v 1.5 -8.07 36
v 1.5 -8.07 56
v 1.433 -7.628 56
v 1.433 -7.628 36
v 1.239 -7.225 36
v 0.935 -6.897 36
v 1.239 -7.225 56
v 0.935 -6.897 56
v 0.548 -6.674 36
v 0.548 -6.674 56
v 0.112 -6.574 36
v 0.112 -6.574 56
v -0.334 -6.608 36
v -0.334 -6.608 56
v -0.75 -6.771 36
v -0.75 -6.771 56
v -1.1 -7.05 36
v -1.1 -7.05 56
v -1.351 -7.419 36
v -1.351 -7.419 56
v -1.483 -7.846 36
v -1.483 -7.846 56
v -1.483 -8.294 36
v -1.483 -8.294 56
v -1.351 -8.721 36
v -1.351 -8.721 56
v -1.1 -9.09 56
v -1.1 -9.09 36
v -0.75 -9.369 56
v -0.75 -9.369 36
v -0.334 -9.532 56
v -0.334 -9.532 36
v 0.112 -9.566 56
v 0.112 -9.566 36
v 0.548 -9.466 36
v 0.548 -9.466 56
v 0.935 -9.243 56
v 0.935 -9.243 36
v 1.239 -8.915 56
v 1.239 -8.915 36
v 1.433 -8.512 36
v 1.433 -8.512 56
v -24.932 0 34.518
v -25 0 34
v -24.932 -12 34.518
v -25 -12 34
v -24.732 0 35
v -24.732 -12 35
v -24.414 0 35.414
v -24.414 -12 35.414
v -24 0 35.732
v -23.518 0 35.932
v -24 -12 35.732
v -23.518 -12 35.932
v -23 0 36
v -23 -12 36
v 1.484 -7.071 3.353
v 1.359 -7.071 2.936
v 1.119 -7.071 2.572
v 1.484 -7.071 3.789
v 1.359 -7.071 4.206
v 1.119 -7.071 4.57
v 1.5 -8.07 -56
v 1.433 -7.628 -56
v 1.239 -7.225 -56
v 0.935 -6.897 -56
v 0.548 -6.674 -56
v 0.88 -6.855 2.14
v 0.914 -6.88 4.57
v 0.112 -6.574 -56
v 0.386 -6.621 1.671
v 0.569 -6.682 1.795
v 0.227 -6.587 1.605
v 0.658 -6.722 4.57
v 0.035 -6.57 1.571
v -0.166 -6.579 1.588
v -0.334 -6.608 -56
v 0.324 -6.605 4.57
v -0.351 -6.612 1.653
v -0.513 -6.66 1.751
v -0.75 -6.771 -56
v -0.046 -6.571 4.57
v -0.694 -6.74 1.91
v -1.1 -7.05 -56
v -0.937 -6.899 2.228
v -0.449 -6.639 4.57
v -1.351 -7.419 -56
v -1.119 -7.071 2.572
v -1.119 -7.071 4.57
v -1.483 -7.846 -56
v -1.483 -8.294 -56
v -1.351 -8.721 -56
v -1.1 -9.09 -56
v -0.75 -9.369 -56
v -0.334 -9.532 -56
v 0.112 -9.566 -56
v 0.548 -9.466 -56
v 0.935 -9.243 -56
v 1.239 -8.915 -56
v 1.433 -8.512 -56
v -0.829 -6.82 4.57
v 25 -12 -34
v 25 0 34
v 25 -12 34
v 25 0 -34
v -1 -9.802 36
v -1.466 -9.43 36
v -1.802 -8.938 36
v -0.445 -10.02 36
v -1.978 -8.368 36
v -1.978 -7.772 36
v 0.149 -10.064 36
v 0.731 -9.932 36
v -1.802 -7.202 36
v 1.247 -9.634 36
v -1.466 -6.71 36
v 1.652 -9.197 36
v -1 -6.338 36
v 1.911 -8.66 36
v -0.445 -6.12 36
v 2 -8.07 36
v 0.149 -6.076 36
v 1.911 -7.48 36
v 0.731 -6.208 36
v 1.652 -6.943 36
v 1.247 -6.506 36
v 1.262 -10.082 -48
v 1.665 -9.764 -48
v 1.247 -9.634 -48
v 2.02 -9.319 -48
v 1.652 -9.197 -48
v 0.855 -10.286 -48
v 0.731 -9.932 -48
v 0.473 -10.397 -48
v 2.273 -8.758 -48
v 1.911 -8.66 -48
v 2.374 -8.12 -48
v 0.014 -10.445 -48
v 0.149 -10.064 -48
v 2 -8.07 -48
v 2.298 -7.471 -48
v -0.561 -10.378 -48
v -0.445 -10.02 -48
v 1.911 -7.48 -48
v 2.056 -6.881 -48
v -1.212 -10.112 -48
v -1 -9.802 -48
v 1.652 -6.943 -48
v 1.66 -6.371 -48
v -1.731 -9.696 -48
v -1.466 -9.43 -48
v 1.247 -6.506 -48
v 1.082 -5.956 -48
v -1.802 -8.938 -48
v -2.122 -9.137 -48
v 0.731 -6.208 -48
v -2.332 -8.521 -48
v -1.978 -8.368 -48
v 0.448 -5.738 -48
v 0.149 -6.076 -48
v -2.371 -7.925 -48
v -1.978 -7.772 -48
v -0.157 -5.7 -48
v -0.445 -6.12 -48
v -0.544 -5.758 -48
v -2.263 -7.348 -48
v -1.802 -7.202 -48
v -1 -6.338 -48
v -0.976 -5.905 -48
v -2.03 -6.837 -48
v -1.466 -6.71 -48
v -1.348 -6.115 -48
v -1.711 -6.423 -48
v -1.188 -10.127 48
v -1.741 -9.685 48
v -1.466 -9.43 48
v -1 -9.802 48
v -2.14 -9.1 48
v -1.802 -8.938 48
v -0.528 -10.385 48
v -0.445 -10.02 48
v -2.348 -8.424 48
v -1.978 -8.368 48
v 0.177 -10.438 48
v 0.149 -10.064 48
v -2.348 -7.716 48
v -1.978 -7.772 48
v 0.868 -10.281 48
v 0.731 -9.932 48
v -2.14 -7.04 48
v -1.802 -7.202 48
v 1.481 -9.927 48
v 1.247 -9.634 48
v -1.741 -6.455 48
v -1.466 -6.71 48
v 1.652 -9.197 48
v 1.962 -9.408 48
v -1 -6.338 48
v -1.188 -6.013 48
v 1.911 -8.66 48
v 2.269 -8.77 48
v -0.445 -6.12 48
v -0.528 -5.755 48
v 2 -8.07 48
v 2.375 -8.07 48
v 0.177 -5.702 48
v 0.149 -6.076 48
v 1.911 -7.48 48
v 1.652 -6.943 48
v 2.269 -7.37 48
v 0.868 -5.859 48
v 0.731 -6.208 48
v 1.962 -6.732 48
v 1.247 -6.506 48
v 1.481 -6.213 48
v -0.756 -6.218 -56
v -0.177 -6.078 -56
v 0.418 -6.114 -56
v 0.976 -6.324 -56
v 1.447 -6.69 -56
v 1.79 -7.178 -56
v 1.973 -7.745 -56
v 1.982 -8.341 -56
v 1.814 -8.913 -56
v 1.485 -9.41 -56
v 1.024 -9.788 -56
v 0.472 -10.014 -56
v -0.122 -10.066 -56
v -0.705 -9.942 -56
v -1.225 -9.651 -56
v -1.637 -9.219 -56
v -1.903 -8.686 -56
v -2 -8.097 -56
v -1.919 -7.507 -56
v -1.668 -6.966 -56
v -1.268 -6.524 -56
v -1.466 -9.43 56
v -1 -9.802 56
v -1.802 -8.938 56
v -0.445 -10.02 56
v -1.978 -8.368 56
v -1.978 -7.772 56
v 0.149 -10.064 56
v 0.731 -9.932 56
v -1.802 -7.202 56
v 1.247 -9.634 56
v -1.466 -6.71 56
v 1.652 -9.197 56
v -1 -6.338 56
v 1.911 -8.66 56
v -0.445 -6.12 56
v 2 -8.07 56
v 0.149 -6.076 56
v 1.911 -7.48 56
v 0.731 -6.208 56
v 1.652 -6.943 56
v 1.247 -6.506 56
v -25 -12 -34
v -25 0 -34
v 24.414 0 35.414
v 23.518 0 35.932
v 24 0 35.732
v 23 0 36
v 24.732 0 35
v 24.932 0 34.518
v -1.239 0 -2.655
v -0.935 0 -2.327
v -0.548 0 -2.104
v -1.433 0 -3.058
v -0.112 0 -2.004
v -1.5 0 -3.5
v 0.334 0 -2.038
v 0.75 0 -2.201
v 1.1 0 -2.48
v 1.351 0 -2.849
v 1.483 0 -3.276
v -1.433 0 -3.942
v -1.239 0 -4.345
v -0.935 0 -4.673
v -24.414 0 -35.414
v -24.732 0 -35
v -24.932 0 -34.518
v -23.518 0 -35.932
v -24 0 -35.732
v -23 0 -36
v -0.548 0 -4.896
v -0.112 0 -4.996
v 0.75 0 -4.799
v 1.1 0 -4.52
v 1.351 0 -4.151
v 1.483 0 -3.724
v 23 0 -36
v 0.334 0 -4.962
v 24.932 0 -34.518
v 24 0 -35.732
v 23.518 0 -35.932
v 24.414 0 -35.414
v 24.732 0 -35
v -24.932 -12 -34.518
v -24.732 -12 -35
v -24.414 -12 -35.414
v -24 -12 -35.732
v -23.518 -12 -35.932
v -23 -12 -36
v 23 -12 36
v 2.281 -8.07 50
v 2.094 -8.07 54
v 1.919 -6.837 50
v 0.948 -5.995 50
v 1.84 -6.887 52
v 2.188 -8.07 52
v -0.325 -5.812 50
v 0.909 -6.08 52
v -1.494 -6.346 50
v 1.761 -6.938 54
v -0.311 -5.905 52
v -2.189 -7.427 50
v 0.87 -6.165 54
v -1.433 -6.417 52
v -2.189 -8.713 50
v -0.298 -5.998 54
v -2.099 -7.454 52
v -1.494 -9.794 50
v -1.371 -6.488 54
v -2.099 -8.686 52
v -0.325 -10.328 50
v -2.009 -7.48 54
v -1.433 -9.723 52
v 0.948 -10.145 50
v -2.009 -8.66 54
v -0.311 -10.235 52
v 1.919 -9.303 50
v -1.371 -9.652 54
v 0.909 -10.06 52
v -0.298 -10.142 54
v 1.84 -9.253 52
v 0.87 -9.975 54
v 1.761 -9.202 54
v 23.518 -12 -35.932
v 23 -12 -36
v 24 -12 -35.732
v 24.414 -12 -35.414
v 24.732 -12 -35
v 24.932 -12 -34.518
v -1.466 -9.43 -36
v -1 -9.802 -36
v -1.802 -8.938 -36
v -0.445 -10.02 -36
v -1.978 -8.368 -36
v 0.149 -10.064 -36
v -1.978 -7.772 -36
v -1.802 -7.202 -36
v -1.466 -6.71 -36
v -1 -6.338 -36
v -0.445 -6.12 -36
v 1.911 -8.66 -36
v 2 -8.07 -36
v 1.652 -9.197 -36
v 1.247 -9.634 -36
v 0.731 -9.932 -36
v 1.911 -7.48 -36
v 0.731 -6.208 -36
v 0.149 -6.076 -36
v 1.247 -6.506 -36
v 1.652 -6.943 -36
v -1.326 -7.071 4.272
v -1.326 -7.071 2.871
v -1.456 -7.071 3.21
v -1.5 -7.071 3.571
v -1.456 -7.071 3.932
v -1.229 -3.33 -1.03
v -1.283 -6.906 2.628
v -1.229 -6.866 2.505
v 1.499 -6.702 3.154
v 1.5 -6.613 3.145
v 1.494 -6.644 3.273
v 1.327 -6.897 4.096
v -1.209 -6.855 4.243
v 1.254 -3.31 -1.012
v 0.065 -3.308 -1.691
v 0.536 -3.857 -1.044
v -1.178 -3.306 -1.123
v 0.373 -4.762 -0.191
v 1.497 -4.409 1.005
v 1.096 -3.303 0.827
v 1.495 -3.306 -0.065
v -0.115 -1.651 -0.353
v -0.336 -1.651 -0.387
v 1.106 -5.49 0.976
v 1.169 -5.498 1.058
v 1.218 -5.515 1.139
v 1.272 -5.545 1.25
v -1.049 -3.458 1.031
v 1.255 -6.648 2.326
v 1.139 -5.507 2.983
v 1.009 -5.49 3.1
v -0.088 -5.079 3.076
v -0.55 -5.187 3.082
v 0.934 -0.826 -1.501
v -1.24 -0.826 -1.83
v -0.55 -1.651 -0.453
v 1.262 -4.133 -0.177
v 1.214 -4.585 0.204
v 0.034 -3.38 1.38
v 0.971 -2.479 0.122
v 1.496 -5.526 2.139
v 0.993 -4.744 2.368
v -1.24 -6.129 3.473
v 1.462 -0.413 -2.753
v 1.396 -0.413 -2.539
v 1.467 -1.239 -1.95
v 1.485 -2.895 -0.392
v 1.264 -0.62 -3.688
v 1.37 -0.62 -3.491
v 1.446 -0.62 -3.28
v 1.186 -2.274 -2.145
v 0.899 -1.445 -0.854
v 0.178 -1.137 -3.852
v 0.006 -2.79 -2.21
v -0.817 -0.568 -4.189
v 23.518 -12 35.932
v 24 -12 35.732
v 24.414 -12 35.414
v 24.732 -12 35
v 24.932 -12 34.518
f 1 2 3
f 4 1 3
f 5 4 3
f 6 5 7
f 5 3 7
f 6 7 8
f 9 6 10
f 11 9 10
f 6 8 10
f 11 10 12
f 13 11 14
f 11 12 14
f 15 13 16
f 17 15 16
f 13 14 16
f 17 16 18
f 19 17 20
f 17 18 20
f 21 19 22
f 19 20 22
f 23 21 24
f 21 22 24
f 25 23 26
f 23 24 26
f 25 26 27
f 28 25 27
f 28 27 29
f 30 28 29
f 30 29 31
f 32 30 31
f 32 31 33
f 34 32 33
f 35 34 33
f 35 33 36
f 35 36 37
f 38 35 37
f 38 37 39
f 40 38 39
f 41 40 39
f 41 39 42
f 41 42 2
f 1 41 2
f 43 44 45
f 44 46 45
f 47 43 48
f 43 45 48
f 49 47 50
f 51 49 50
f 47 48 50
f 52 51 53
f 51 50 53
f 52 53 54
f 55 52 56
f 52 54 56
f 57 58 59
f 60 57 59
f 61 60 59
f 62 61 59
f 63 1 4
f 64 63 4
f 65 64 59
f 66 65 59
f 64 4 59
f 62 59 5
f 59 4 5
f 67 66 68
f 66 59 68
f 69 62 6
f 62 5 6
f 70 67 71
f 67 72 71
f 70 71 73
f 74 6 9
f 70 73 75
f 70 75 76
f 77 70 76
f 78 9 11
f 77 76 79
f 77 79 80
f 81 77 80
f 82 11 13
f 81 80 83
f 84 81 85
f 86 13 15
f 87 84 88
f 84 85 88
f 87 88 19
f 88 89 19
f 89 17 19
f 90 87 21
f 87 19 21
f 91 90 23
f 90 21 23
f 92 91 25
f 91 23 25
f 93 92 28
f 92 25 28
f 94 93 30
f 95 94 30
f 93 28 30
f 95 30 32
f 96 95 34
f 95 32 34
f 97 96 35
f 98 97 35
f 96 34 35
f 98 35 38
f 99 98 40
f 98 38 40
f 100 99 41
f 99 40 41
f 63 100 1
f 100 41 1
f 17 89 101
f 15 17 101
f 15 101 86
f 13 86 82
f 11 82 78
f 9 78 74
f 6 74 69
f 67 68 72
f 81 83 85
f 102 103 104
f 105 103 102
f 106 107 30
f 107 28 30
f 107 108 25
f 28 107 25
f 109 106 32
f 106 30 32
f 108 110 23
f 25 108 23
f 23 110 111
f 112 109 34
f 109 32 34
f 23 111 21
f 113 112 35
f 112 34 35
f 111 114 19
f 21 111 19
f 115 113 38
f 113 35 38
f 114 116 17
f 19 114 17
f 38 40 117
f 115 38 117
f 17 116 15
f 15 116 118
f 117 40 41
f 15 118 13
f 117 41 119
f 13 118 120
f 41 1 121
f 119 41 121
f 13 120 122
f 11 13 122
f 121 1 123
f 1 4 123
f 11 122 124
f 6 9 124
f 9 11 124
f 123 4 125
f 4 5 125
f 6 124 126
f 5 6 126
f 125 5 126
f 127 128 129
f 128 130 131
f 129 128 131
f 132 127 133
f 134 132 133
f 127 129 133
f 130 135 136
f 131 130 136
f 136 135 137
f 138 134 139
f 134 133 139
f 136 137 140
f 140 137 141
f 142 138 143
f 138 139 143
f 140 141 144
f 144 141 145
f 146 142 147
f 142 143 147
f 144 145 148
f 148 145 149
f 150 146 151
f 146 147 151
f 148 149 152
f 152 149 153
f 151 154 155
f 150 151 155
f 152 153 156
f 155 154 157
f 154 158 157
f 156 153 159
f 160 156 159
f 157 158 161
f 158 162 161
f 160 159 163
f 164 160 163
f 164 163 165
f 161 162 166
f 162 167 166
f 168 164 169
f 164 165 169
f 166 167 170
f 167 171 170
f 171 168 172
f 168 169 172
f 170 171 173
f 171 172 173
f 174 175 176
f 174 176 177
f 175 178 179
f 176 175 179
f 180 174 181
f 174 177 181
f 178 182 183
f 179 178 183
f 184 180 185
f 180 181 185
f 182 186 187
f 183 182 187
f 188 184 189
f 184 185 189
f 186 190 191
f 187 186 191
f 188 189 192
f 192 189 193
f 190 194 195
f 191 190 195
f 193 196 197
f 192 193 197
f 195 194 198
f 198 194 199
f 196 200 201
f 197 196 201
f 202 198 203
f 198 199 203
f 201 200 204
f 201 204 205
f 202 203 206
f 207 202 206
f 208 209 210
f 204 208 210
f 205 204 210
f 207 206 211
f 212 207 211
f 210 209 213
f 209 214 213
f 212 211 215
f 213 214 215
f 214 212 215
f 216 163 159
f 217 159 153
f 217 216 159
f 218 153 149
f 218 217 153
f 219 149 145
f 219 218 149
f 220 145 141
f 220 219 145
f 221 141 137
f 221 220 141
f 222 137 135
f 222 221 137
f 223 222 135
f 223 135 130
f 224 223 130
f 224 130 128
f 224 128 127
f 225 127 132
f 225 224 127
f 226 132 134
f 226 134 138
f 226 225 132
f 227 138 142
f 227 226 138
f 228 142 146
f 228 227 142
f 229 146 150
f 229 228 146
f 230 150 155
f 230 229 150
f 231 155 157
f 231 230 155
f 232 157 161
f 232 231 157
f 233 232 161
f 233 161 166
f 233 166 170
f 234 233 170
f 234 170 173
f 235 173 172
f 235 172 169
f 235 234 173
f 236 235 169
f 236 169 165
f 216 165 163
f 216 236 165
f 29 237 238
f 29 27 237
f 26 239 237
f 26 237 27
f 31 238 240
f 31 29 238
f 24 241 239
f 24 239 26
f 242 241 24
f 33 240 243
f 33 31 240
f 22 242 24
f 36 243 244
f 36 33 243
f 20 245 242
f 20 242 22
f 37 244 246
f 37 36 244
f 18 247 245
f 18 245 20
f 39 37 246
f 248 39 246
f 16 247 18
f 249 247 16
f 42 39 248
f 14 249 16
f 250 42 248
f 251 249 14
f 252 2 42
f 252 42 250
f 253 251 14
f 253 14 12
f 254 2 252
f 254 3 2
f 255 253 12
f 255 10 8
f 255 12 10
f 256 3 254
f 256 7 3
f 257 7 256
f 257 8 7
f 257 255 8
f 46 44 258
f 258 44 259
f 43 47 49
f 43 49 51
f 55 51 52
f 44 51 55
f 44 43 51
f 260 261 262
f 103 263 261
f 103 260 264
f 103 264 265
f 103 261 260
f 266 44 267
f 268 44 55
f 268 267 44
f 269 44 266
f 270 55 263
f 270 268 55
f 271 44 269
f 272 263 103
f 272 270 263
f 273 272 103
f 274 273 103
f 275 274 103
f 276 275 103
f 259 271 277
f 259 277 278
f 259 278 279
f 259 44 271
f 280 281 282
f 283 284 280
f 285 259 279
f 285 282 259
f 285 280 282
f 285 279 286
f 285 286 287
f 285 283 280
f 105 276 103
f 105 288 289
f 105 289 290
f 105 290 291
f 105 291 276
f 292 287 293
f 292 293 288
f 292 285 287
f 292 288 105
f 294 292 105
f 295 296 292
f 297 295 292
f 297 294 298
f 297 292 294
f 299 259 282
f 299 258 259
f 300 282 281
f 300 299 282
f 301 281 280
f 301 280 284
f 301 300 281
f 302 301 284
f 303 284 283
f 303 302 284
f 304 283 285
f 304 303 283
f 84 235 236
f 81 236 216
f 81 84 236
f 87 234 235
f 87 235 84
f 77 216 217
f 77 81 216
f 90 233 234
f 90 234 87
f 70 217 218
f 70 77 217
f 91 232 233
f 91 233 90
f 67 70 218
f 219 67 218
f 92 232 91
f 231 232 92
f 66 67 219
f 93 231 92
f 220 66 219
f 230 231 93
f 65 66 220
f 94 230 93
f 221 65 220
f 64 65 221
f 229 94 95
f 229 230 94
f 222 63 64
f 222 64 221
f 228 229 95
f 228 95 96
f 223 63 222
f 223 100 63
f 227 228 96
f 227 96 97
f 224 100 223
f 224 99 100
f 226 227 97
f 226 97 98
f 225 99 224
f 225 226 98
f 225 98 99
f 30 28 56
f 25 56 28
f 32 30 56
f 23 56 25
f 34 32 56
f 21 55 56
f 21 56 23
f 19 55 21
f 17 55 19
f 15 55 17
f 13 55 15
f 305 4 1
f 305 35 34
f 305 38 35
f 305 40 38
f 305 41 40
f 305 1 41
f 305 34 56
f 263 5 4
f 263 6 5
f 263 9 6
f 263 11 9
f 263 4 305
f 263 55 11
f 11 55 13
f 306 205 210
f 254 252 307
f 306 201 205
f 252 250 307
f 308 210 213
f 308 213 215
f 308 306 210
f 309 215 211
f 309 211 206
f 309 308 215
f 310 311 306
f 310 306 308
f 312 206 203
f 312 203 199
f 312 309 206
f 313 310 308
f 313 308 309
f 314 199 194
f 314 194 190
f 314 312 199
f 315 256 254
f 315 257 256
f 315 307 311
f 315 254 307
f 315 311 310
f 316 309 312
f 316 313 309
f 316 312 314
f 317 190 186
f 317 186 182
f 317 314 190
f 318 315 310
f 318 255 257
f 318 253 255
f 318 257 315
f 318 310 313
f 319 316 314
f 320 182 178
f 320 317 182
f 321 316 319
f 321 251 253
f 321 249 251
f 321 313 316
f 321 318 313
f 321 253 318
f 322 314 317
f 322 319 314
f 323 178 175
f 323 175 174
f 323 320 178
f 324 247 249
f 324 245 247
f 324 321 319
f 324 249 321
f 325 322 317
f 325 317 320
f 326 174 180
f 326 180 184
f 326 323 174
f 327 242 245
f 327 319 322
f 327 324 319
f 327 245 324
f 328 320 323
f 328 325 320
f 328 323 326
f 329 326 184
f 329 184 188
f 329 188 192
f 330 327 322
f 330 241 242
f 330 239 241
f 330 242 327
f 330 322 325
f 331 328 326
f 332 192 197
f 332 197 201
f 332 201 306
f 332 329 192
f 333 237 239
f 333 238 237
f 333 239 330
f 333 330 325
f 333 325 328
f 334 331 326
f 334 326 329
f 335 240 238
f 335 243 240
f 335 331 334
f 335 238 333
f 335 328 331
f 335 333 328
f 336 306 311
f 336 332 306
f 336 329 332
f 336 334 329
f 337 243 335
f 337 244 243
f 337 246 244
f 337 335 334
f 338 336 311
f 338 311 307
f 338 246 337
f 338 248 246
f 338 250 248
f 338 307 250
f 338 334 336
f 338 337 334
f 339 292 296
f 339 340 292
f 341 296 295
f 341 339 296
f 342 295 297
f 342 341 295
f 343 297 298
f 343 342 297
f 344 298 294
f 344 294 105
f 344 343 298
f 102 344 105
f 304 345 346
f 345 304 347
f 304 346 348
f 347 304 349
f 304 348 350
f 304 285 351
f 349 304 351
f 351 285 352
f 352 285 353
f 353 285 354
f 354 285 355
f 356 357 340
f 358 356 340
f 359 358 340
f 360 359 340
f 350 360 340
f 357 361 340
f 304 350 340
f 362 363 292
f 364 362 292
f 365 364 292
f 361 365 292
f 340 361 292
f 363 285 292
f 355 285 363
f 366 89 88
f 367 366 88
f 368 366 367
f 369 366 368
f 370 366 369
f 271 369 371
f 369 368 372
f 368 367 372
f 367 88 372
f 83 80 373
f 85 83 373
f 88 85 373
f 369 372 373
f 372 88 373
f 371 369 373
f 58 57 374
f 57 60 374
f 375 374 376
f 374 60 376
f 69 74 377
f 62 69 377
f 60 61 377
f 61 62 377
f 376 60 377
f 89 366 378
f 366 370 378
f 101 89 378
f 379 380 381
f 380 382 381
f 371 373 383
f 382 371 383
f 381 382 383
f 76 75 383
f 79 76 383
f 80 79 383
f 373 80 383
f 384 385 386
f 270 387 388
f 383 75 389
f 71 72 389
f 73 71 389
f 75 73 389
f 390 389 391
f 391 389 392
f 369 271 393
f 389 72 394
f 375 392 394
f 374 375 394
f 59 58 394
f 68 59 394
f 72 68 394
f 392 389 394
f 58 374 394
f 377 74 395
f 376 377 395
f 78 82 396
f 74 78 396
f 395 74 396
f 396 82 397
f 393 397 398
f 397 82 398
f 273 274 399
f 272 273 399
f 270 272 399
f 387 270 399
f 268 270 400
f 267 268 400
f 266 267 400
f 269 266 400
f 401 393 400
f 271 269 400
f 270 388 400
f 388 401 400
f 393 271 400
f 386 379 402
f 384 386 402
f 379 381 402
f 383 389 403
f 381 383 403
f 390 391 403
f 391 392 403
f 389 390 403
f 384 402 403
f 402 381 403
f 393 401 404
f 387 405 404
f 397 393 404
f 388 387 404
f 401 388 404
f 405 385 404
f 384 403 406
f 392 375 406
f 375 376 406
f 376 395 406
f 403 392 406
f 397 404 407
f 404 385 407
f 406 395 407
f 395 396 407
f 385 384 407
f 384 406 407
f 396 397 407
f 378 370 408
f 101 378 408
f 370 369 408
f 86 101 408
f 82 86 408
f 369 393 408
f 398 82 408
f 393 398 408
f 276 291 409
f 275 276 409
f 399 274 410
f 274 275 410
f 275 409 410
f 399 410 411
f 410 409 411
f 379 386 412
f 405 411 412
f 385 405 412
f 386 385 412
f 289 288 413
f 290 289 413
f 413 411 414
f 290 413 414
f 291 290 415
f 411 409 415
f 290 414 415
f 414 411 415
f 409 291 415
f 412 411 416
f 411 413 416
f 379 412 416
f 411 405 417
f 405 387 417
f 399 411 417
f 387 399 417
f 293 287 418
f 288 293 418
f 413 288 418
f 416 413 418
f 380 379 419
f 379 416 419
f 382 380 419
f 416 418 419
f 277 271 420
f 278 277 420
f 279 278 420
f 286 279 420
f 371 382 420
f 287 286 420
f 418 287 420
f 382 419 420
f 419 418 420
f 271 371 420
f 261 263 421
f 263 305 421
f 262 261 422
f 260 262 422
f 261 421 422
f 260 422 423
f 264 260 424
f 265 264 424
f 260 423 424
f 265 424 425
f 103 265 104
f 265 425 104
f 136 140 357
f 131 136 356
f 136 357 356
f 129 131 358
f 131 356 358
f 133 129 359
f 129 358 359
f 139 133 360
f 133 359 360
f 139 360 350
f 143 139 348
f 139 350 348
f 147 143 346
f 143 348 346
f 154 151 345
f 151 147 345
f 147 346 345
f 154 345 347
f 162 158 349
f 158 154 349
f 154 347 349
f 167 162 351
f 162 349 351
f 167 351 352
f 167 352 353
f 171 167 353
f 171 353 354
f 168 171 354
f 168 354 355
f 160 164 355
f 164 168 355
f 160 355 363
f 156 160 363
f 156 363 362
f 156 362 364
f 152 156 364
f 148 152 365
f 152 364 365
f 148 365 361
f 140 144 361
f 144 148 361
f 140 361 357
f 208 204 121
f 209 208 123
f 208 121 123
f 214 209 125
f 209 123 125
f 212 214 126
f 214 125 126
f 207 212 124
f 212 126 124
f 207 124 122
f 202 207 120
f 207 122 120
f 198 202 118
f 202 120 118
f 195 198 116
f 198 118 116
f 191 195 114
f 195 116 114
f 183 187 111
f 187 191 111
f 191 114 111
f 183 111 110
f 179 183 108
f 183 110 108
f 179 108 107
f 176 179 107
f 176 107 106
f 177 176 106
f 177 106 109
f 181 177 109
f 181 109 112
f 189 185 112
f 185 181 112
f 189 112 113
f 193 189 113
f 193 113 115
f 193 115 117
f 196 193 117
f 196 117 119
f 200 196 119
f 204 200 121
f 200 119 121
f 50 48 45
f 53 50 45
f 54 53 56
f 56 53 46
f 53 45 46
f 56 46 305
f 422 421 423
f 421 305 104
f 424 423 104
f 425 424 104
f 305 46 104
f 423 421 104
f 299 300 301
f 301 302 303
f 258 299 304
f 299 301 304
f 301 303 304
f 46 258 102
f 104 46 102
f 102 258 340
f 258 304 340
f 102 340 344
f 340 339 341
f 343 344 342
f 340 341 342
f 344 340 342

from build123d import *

# Parameters (mm, degrees)
PLATFORM_W                   = 50
PLATFORM_H                   = 72
PLATFORM_W_2                 = 22.5
PLATFORM_H_2                 = 43
PLATFORM_HEIGHT_DEPTH        = 12
TUBE_INNER_DIAMETER_SKETCH_R = 1.5
FILLET1_R                    = 2
OUTER_DIAMETER_OF_LUMEN_1_R  = 2
TUBING_SIDE_1_DEPTH          = 20
OUTER_DIAMETER_OF_LUMEN_2_R  = 2
TUBING_SIDE_2_DEPTH          = 20
ADAPTER_1_SKETCH_R           = 2.375
LUMEN_INNER_DIAMETER_R       = 1.5
HOLLOWING_OUT_LUMEN_DEPTH    = 116.381974426


with BuildPart() as part:
    # Platform → Platform Height (new body)
    # profile 1 of 2: a face of its own
    with BuildSketch(Plane(origin=(0, 0, 0), x_dir=(1, 0, 0), z_dir=(0, 1, 0))):
        Rectangle(PLATFORM_W, PLATFORM_H)
        Rectangle(PLATFORM_W_2, PLATFORM_H_2, mode=Mode.SUBTRACT)
    # profile 2 of 2: a face of its own
    with BuildSketch(Plane(origin=(0, 0, 0), x_dir=(1, 0, 0), z_dir=(0, 1, 0))):
        Rectangle(PLATFORM_W_2, PLATFORM_H_2)
    extrude(amount=-PLATFORM_HEIGHT_DEPTH)

    # Tube Inner Diameter: sweep along a curve in space
    with BuildLine() as tube_inner_diameter_path:
        Line((0, 0, -3.5), (0, -7.071067812, 3.571067812))
    # Tube Inner Diameter Sketch → Tube Inner Diameter (sweep, cut)
    with BuildSketch(Plane(origin=(0, 0, 0), x_dir=(-1, 0, 0), z_dir=(0, -1, 0))):
        with Locations((0, 3.5)):
            Circle(TUBE_INNER_DIAMETER_SKETCH_R)
    sweep(path=tube_inner_diameter_path.line, mode=Mode.SUBTRACT)

    # Fillet1
    fillet1_edges = [part.edges().sort_by_distance(p)[0] for p in [
        (25, -6, 36),
        (-25, -6, 36),
        (-25, -6, -36),
        (25, -6, -36),
    ]]
    fillet(fillet1_edges, radius=FILLET1_R)

    # Outer Diameter of Lumen 2 → Tubing Side 2 (add)
    with BuildSketch(Plane(origin=(0, 0, -36), x_dir=(-1, 0, 0), z_dir=(0, 0, -1))):
        with Locations(Location((0, -8.07, 0), (0, 0, 180))):
            Circle(OUTER_DIAMETER_OF_LUMEN_2_R)
    extrude(amount=TUBING_SIDE_2_DEPTH)

    # Adapter #2: read off the stored shape, not the designer's step
    # Adapter #2: loft between two sections, ruled curve by curve
    adapter_2_from = [
        Edge.make_bspline([(-0.156573295, -5.700166714, -48), (4.583093277, -5.387020124, -48), (4.896239867, -10.126686696, -48), (0.156573295, -10.439833286, -48), (-4.583093277, -10.752979876, -48), (-4.896239867, -6.013313304, -48), (-0.156573295, -5.700166714, -48)], [0, 0, 0, 0, 0.5, 0.5, 0.5, 1, 1, 1, 1], 3, [1, 0.333333333, 0.333333333, 1, 0.333333333, 0.333333333, 1]),
    ]
    adapter_2_to = [
        Edge.make_bspline([(-0.756069385, -6.218417141, -56), (2.947096334, -4.706278371, -56), (4.459235104, -8.40944409, -56), (0.756069385, -9.921582859, -56), (-2.947096334, -11.433721629, -56), (-4.459235104, -7.73055591, -56), (-0.756069385, -6.218417141, -56)], [0, 0, 0, 0, 0.5, 0.5, 0.5, 1, 1, 1, 1], 3, [1, 0.333333333, 0.333333333, 1, 0.333333333, 0.333333333, 1]),
    ]
    adapter_2 = Solid(Shell([*[Face.make_surface_from_curves(adapter_2_from[k], adapter_2_to[k]) for k in range(1)], Face(Wire(adapter_2_from)), Face(Wire(adapter_2_to))]))
    add(adapter_2)


with BuildPart() as body_2:
    # Outer Diameter of Lumen 1 → Tubing Side 1 (new body)
    with BuildSketch(Plane.XY.offset(36)):
        with Locations((0, -8.07)):
            Circle(OUTER_DIAMETER_OF_LUMEN_1_R)
    extrude(amount=TUBING_SIDE_1_DEPTH)

    # Adapter #1 Sketch → section 0 of adapter_1
    with BuildSketch(Plane.XY.offset(48), mode=Mode.PRIVATE) as adapter_1_s0:
        with Locations((0, -8.07)):
            Circle(ADAPTER_1_SKETCH_R)
    # loft up to a face of the part (adapter_1)
    loft([adapter_1_s0.sketch, Face(Wire([body_2.edges().sort_by_distance((-1.369094212, -6.612062745, 56))[0]]))])


with BuildPart() as hollowing_out_lumen_tool:
    # Lumen Inner Diameter → Hollowing Out Lumen (new, through all)
    with BuildSketch(Plane.XY.offset(56)):
        with Locations((0, -8.07)):
            Circle(LUMEN_INNER_DIAMETER_R)
    extrude(amount=-HOLLOWING_OUT_LUMEN_DEPTH)


with BuildPart() as part_1:
    add(part.part)

    # Hollowing Out Lumen: cut by hollowing_out_lumen_tool
    add(hollowing_out_lumen_tool.part, mode=Mode.SUBTRACT)


with BuildPart() as body_2_1:
    add(body_2.part)

    # Hollowing Out Lumen: cut by hollowing_out_lumen_tool
    add(hollowing_out_lumen_tool.part, mode=Mode.SUBTRACT)


solid = Compound([part_1.part, body_2_1.part])
